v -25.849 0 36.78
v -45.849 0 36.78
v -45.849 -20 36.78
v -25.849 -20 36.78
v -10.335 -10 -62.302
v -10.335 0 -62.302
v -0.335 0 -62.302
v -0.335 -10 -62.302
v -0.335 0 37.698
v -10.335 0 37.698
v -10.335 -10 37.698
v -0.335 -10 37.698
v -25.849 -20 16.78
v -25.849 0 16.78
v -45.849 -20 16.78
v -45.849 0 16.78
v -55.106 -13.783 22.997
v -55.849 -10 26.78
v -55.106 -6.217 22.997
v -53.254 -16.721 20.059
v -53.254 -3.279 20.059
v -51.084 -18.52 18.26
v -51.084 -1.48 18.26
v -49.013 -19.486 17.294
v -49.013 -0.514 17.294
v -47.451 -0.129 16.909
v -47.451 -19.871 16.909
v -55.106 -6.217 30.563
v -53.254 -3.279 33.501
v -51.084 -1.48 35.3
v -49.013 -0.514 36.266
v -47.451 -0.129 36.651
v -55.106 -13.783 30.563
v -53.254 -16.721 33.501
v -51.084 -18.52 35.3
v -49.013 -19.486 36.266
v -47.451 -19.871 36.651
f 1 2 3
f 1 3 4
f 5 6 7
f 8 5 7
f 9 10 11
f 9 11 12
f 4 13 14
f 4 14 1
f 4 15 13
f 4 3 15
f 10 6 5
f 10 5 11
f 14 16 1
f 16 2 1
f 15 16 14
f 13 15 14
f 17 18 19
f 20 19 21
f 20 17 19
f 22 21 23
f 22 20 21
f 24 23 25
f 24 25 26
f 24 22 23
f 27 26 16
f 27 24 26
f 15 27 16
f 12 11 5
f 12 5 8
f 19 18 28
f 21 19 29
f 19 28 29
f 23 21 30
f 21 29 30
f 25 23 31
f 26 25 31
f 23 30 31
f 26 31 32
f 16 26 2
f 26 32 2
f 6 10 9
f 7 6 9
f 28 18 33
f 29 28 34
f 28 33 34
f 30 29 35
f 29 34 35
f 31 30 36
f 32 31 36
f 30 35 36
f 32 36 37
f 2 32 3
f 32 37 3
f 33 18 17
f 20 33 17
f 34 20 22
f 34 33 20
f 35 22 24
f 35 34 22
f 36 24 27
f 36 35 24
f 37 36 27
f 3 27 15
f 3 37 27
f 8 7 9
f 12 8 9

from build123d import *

# Parameters (mm, degrees)
F0_W     = 10
F0_H     = 100
F1_DEPTH = 10
F2_W     = 30
F2_H     = 20
F3_DEPTH = 20
F4_R     = 9.99999


# Not quite as in the source:
# - a fillet or chamfer is up to 0.001 mm smaller than in the source, because OpenCascade refuses the exact size


with BuildPart() as f1:
    # F0 (on Front) → F1 (new body)
    with BuildSketch(Plane.XZ):
        with Locations((-5.3346473165, -12.30174932)):
            Rectangle(F0_W, F0_H)
    extrude(amount=F1_DEPTH)


with BuildPart() as f3:
    # F2 (on Front) → F3 (new body)
    with BuildSketch(Plane.XZ):
        with Locations((-40.8489312977, 26.7800622059)):
            Rectangle(F2_W, F2_H)
    extrude(amount=F3_DEPTH)

    # F4 (radius 10 in the source; OpenCascade refuses exactly that, so slightly less here)
    f4_edges = [f3.edges().sort_by_distance(p)[0] for p in [
        (-55.848931, -10, 36.780062),
        (-55.848931, -10, 16.780062),
        (-55.848931, 0, 26.780062),
        (-55.848931, -20, 26.780062),
    ]]
    fillet(f4_edges, radius=F4_R)


solid = Compound([f1.part, f3.part])
